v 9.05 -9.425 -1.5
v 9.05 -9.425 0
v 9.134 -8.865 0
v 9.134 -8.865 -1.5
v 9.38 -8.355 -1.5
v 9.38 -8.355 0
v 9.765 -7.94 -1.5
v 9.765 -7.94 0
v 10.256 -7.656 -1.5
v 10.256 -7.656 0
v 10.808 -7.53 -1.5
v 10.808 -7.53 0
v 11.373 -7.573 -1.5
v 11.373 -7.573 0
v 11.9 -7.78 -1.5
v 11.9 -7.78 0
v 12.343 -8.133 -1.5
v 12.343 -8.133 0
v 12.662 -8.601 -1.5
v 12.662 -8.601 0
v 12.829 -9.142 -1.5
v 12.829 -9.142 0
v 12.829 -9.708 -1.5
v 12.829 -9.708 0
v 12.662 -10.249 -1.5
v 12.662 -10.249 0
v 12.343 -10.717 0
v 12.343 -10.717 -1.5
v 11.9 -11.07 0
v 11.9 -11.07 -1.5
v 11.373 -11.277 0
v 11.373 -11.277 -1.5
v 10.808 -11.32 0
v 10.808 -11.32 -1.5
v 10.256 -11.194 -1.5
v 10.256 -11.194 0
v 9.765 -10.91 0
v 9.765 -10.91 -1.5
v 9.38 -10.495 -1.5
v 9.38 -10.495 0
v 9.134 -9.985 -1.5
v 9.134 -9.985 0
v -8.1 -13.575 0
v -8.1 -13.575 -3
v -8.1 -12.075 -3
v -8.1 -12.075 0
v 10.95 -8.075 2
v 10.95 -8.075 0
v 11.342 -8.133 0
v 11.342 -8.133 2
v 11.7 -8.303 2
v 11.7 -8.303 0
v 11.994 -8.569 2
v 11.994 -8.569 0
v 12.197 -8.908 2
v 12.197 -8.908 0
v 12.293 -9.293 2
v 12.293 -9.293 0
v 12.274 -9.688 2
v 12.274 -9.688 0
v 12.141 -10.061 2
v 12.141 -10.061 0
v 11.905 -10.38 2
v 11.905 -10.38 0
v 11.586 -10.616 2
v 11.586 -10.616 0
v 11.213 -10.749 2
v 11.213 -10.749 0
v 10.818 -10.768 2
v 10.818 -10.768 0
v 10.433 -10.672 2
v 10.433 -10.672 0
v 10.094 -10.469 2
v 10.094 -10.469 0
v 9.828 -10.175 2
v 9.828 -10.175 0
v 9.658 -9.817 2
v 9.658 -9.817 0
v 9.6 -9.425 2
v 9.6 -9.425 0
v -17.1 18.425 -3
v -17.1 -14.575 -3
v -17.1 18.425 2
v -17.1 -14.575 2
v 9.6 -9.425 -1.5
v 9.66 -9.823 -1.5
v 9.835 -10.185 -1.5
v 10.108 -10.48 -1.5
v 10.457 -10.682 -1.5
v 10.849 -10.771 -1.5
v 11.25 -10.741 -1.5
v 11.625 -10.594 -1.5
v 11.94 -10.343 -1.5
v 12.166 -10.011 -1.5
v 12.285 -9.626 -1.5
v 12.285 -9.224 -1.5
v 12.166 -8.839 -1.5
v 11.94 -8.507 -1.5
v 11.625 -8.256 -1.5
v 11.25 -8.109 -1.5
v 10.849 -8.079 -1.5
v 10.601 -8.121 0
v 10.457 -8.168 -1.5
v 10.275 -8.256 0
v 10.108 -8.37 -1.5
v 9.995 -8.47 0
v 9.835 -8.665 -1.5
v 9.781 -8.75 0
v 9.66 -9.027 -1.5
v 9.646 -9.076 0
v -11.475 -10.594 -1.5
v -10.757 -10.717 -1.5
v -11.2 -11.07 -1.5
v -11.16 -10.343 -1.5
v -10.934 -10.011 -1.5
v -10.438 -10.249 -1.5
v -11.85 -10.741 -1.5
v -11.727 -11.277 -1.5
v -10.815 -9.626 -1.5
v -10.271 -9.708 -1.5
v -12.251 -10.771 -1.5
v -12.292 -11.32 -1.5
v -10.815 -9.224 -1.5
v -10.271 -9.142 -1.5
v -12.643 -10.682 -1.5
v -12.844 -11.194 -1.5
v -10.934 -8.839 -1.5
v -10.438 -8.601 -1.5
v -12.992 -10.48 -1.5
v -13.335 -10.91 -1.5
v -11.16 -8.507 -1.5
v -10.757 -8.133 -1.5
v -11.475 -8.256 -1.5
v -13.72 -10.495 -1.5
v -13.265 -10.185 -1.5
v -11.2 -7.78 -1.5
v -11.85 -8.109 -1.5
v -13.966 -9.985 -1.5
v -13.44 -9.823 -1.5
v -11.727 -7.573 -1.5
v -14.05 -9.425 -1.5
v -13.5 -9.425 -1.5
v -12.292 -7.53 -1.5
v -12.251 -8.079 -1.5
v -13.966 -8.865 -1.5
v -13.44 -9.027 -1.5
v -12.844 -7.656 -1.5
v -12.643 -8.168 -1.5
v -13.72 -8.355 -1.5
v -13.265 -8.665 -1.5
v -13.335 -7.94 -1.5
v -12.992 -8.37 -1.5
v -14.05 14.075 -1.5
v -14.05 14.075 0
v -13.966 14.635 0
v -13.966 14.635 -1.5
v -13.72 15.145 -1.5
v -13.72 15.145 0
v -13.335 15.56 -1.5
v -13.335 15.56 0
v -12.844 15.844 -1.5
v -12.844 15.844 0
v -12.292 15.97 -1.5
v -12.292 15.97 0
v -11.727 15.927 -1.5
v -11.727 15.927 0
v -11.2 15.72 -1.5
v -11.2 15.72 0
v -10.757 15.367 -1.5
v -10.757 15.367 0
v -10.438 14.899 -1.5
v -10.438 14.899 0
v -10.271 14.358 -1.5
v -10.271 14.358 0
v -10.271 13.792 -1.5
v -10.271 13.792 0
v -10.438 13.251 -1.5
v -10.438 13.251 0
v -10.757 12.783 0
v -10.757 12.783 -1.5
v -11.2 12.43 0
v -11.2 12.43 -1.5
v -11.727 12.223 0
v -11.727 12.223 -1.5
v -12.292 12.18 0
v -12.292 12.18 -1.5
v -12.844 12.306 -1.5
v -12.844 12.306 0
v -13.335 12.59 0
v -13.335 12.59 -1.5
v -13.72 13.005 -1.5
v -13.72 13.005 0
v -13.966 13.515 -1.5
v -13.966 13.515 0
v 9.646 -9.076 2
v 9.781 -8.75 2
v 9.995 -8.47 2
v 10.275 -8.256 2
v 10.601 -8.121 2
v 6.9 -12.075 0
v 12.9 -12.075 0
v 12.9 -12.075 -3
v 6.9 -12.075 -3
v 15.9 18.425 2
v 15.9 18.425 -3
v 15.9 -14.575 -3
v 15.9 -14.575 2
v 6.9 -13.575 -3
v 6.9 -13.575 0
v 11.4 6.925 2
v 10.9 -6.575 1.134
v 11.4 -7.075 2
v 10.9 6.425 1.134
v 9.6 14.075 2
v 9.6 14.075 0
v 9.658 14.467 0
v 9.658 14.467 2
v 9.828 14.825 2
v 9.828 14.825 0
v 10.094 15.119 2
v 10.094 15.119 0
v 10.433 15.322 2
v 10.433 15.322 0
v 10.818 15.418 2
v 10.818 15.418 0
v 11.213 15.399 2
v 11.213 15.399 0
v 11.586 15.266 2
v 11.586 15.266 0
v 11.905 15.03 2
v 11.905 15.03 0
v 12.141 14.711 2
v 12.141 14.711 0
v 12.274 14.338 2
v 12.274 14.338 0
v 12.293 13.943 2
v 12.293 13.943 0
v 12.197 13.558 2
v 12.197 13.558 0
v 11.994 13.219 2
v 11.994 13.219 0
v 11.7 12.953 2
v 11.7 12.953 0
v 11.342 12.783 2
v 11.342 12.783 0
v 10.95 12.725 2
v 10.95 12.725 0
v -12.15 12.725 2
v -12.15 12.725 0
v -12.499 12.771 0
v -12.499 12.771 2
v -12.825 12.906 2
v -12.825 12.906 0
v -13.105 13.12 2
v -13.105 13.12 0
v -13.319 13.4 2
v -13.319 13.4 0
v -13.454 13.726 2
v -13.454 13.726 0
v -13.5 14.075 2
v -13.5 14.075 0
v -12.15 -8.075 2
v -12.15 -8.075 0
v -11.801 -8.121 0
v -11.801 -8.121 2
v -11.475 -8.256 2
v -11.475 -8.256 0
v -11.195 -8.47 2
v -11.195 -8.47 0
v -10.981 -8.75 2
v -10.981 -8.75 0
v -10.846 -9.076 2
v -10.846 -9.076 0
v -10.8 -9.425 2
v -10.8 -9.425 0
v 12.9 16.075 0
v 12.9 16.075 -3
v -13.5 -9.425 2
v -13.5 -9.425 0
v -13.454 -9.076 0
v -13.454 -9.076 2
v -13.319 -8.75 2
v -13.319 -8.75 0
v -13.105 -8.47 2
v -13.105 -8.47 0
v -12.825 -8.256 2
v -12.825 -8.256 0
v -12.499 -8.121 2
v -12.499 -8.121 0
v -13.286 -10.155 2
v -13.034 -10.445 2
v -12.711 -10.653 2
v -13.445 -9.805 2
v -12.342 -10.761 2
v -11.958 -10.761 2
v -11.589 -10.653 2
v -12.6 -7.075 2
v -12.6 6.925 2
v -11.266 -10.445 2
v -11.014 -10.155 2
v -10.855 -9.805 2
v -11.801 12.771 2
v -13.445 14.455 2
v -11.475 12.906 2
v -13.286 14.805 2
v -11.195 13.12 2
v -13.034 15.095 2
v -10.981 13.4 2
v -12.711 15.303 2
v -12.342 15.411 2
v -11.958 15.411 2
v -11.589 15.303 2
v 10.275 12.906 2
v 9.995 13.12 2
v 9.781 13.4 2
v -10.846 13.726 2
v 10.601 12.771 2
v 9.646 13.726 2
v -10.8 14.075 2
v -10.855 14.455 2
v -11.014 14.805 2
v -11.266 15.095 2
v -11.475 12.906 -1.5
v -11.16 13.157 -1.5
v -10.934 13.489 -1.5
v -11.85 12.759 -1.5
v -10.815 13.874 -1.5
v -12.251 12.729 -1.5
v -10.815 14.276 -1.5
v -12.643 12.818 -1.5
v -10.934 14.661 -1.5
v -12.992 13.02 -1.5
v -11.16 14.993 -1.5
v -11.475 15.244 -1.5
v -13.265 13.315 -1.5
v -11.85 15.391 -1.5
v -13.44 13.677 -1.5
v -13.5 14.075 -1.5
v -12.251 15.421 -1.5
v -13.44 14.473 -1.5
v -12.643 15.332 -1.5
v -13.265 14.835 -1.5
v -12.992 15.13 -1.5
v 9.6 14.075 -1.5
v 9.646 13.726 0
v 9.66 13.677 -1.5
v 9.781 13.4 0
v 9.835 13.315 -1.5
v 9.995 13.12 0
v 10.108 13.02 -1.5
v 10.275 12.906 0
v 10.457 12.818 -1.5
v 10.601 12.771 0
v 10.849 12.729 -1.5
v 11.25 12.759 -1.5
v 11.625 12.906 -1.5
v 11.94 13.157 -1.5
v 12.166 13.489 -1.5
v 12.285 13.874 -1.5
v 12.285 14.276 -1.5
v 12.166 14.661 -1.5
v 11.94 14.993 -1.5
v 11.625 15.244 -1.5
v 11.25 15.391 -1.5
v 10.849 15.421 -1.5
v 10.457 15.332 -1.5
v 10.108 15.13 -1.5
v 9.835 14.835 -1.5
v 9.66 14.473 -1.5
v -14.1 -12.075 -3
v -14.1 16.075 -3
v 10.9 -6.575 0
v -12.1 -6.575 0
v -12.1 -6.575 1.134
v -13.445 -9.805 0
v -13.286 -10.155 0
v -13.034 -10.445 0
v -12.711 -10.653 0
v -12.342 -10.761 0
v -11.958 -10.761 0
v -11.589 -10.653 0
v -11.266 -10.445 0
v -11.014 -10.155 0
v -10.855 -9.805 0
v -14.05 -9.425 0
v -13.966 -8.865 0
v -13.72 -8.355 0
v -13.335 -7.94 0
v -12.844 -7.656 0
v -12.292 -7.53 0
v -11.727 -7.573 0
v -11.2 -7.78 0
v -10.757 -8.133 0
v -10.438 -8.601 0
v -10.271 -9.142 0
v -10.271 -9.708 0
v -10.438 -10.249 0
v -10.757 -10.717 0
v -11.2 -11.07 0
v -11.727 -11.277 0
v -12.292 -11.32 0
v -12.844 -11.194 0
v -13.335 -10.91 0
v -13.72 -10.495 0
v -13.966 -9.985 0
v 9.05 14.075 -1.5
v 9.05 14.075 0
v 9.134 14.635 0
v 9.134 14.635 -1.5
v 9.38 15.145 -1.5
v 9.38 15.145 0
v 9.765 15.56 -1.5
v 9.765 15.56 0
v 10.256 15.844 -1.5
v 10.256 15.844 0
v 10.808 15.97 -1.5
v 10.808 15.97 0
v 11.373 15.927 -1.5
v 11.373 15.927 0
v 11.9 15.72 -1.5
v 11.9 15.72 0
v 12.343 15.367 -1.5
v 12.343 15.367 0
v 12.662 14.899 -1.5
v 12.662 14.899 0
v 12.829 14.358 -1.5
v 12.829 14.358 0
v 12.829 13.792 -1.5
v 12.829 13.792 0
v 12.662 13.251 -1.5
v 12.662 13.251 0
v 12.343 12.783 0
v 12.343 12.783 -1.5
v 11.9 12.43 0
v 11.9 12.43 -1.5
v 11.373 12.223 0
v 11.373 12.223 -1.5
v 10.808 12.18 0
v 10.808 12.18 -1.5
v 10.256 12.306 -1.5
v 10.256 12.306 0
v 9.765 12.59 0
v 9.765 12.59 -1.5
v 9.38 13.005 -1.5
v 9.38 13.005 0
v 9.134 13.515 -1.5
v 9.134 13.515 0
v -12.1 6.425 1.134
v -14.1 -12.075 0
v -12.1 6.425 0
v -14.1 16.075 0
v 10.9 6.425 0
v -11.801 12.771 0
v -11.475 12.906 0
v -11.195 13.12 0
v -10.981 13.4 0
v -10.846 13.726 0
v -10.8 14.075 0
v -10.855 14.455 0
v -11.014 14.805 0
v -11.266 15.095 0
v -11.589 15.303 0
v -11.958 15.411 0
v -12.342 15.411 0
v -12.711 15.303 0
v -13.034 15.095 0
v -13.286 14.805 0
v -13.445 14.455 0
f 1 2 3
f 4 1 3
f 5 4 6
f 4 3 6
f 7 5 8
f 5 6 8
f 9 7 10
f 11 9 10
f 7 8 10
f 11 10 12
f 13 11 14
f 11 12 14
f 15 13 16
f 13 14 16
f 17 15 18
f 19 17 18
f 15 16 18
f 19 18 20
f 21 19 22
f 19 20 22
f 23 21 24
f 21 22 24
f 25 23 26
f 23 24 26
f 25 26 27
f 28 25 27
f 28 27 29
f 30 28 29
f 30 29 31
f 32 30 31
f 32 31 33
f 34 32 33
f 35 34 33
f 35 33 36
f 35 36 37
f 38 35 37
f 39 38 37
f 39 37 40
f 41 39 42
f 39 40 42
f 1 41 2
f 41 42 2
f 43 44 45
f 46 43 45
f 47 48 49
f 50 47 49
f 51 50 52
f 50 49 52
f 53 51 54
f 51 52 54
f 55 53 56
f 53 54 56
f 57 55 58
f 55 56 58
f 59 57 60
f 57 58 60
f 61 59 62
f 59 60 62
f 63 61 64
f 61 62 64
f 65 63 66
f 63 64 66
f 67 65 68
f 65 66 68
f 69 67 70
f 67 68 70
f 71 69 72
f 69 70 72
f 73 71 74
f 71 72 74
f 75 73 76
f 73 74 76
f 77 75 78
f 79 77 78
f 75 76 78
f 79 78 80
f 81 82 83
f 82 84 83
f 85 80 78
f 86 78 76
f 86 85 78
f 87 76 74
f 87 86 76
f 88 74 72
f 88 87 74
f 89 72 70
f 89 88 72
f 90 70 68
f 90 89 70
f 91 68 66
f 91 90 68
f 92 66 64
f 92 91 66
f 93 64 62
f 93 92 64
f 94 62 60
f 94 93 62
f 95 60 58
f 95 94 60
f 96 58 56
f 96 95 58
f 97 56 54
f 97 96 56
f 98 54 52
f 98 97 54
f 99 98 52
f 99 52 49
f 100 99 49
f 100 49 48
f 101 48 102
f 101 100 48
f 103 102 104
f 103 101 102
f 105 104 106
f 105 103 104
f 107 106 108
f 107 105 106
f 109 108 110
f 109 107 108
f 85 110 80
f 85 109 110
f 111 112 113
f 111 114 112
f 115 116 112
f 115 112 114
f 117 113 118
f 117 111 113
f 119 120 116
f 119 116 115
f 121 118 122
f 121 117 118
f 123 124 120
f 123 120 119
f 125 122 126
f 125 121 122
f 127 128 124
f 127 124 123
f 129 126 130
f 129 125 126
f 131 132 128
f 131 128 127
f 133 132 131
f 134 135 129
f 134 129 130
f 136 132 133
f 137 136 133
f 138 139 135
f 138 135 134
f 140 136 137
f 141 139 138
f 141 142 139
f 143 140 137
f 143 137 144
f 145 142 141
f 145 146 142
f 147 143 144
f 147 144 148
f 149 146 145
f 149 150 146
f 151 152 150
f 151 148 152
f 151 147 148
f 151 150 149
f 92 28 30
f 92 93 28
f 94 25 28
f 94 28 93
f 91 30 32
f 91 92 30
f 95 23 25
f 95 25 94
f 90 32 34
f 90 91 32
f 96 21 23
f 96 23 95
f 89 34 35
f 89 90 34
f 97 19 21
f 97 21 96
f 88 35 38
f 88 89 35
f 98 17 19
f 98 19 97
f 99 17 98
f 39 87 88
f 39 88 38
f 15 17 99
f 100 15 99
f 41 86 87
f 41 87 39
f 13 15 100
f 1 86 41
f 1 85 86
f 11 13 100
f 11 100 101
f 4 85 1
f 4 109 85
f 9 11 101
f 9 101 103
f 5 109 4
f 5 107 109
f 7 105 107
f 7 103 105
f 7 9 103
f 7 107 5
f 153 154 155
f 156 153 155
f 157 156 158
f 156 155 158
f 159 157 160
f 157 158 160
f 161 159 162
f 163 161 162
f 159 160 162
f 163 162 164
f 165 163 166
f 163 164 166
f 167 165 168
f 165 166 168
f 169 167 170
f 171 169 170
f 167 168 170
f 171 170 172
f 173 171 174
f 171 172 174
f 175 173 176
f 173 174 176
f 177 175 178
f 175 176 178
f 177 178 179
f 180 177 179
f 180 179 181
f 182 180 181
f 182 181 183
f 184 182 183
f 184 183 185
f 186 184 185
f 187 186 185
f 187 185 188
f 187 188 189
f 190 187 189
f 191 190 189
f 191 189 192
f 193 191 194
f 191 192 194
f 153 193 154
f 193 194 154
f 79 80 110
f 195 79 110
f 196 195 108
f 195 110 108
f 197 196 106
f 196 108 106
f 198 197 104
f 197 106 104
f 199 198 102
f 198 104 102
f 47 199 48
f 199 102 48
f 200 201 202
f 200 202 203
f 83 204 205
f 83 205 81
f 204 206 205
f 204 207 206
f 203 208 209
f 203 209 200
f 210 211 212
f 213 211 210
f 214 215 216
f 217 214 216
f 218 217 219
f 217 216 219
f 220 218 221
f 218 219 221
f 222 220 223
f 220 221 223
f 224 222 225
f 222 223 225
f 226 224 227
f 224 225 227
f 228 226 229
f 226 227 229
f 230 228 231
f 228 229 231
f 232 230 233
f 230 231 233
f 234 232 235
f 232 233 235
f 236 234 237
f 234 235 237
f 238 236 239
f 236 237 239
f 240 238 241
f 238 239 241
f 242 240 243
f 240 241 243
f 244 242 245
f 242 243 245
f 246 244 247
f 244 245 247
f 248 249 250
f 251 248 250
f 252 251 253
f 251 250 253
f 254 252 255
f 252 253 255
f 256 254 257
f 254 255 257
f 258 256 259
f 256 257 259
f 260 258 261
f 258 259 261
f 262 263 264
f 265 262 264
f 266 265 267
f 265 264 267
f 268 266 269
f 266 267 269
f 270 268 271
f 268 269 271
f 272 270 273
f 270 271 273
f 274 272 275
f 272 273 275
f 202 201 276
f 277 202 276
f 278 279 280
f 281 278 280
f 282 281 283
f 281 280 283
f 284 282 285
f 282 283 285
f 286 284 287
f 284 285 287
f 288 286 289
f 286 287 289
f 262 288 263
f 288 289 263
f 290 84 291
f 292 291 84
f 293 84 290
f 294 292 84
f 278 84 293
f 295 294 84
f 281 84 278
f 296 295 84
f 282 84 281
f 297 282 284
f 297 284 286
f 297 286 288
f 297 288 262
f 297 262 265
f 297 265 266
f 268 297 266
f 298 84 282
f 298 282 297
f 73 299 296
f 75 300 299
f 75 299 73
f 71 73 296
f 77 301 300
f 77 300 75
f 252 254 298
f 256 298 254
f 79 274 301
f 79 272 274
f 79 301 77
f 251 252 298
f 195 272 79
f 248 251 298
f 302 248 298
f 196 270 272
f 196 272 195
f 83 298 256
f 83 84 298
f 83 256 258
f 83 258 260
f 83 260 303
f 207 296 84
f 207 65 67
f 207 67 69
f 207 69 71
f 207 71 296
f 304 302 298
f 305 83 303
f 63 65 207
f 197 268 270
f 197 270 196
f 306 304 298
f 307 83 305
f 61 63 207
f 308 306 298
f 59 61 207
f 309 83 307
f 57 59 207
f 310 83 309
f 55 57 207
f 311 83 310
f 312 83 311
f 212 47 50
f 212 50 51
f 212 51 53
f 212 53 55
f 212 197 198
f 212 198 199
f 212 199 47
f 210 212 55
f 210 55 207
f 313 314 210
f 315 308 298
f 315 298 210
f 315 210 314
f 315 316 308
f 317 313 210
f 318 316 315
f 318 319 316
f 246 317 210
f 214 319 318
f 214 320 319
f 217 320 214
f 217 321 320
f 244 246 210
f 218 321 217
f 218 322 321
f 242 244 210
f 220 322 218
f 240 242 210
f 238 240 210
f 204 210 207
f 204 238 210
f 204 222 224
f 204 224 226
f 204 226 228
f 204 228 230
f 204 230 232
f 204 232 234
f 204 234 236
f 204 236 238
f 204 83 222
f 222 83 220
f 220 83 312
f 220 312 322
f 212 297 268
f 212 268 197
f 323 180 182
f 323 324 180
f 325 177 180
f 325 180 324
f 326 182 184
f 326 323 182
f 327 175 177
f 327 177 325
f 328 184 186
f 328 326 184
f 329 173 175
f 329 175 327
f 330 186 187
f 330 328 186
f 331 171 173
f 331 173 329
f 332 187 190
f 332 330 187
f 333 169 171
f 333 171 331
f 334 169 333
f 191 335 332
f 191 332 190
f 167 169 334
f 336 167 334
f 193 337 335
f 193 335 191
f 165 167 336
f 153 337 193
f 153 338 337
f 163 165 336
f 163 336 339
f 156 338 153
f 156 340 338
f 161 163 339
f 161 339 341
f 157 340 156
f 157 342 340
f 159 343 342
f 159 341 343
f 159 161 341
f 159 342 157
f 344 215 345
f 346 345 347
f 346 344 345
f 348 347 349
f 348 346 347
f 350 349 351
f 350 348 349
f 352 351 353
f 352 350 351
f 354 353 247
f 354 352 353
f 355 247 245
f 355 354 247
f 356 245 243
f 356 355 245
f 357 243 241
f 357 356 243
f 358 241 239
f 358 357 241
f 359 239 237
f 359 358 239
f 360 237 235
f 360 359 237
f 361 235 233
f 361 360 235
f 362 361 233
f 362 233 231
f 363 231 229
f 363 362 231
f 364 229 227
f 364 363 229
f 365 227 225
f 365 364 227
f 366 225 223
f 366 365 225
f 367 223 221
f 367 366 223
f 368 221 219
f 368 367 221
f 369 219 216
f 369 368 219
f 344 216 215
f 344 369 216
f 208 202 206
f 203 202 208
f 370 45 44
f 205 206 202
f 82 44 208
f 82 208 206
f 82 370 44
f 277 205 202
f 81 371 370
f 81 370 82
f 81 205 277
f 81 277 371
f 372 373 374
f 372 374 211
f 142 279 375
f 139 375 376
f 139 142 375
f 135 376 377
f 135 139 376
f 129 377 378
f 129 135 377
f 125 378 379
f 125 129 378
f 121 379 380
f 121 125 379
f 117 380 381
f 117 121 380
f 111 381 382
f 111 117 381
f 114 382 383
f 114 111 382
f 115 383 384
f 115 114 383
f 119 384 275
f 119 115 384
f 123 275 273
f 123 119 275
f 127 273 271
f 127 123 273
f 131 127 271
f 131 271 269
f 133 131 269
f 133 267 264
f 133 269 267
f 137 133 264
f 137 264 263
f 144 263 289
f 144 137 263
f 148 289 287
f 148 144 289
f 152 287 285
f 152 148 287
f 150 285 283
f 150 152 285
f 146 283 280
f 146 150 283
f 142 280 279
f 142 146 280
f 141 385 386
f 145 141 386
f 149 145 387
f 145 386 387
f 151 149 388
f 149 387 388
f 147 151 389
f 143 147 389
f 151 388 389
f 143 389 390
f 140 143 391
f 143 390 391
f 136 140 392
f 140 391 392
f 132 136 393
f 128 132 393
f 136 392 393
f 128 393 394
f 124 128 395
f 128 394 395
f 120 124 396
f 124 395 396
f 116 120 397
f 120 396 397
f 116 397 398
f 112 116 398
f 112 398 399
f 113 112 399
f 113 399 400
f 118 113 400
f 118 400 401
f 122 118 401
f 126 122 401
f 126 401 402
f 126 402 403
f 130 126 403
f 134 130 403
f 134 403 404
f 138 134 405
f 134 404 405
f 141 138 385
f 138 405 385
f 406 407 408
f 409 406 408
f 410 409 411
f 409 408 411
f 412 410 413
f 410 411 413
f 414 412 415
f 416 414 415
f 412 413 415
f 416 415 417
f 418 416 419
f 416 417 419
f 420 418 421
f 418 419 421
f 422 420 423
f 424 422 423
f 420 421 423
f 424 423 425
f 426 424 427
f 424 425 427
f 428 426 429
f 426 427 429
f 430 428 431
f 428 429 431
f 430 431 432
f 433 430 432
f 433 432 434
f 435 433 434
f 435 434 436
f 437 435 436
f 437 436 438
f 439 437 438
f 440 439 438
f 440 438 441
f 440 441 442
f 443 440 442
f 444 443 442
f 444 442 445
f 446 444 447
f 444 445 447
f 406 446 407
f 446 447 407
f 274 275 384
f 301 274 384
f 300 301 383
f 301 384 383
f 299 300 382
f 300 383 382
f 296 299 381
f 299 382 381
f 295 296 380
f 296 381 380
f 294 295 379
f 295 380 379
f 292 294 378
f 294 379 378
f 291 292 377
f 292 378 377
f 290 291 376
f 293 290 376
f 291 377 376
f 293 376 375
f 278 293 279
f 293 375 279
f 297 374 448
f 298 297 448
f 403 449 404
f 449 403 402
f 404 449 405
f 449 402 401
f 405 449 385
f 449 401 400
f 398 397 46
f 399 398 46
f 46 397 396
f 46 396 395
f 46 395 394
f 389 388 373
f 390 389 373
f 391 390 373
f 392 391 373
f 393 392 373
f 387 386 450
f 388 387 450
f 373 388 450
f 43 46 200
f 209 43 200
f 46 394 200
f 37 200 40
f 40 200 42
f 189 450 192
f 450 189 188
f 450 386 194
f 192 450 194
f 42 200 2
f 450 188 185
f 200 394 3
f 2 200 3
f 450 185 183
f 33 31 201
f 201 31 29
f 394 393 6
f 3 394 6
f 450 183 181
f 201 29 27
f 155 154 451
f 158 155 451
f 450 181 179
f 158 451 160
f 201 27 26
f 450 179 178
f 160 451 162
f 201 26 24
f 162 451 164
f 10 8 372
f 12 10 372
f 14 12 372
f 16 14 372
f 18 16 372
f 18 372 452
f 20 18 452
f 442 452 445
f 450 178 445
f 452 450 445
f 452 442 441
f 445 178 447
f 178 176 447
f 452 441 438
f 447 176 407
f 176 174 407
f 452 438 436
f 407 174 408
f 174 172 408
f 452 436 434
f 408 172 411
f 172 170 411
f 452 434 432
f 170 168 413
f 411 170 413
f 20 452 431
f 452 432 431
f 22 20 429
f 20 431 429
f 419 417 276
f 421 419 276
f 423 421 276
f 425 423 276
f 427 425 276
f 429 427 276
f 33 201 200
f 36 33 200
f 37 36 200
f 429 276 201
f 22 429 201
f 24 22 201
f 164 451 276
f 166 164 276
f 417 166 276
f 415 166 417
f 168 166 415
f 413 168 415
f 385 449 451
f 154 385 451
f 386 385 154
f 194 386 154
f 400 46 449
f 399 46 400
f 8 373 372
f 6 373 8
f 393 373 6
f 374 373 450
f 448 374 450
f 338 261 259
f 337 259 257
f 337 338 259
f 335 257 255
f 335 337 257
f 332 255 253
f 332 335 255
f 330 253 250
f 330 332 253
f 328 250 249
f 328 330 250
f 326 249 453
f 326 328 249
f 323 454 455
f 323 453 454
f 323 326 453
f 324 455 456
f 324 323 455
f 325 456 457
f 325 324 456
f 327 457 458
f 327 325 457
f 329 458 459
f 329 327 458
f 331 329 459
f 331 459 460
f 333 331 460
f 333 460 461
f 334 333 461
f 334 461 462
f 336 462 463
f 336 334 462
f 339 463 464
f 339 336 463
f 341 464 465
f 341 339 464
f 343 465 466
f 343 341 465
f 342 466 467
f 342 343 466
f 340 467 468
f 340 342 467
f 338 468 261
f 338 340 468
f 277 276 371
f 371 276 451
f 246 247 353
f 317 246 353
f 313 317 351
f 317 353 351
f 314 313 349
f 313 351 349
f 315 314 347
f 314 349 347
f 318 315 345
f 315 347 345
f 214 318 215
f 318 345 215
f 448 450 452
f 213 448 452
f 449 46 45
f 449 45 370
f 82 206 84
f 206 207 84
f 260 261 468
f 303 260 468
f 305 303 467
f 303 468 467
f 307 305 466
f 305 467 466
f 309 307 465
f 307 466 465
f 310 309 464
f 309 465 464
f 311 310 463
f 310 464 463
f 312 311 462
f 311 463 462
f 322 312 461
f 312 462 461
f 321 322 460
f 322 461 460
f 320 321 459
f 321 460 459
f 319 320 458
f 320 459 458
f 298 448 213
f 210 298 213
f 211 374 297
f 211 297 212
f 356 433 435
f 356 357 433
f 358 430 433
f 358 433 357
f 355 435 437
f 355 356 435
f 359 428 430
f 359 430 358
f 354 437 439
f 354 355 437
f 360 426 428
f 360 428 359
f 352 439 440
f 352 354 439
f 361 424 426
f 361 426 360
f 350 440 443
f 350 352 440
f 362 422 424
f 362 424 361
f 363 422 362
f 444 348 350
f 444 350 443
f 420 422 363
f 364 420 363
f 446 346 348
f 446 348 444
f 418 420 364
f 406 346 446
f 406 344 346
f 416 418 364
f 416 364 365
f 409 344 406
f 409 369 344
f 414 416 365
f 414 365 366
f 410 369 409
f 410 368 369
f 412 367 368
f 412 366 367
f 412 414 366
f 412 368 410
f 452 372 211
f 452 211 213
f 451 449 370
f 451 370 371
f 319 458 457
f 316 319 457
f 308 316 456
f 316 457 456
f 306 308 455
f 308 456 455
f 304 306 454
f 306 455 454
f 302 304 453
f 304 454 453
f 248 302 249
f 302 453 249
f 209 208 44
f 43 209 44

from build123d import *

# Parameters (mm, degrees)
SKETCH1_W           = 33
SKETCH1_H           = 33
SKETCH1_W_2         = 23
SKETCH1_H_2         = 13
BOSS_EXTRUDE1_DEPTH = 2
CHAMFER1_SIZE       = 0.5
CHAMFER1_SIZE2      = 0.866025404
SKETCH2_W           = 33
SKETCH2_H           = 33
SKETCH2_W_2         = 27
SKETCH2_H_2         = 28.15
BOSS_EXTRUDE2_DEPTH = 3
CUT_EXTRUDE2_DEPTH  = 3
SKETCH4_R           = 1.9
SKETCH4_R_2         = 1.1
BOSS_EXTRUDE3_DEPTH = 1.5
CUT_EXTRUDE3_START  = -10
SKETCH5_R           = 1.35
CUT_EXTRUDE3_DEPTH  = 10
SKETCH6_W           = 15
SKETCH6_H           = 1.5
CUT_EXTRUDE4_DEPTH  = 3


with BuildPart() as part:
    # Sketch1 → Boss-Extrude1 (new body)
    with BuildSketch(Plane.XY):
        with Locations((-0.6, 1.925)):
            Rectangle(SKETCH1_W, SKETCH1_H)
        with Locations((-0.6, -0.075)):
            Rectangle(SKETCH1_W_2, SKETCH1_H_2, mode=Mode.SUBTRACT)
    extrude(amount=BOSS_EXTRUDE1_DEPTH)

    # Chamfer1
    chamfer1_edges = [part.edges().sort_by_distance(p)[0] for p in [
        (-12.1, -0.075, 2),
        (-0.6, -6.575, 2),
        (10.9, -0.075, 2),
        (-0.6, 6.425, 2),
    ]]
    chamfer1_side = [part.faces().sort_by_distance(p)[0] for p in [
        (-0.6, -14.108309524, 2),
    ]]
    chamfer(chamfer1_edges, length=CHAMFER1_SIZE, length2=CHAMFER1_SIZE2, reference=chamfer1_side[0])

    # Sketch2 → Boss-Extrude2 (add)
    with BuildSketch(Plane(origin=(0, 0, 0), x_dir=(-1, 0, 0), z_dir=(0, 0, -1))):
        with Locations((0.6, 1.925)):
            Rectangle(SKETCH2_W, SKETCH2_H)
        with Locations((0.6, 2)):
            Rectangle(SKETCH2_W_2, SKETCH2_H_2, mode=Mode.SUBTRACT)
    extrude(amount=BOSS_EXTRUDE2_DEPTH)

    # Sketch3 → Cut-Extrude2 (cut)
    with BuildSketch(Plane(origin=(0, 0, 0), x_dir=(-1, 0, 0), z_dir=(0, 0, -1))):
        with BuildLine():
            Line((-10.95, 12.725), (-10.95, 14.075))
            Line((-10.95, 14.075), (-9.6, 14.075))
            ThreePointArc((-9.6, 14.075), (-11.904594155, 15.029594155), (-10.95, 12.725))
        make_face()
        with BuildLine():
            Line((-9.6, 14.075), (-10.95, 14.075))
            Line((-10.95, 14.075), (-10.95, 12.725))
            ThreePointArc((-10.95, 12.725), (-9.995405845, 13.120405845), (-9.6, 14.075))
        make_face()
        with BuildLine():
            ThreePointArc((13.5, 14.075), (12.15, 15.425), (10.8, 14.075))
            Line((10.8, 14.075), (12.15, 14.075))
            Line((12.15, 14.075), (12.15, 12.725))
            ThreePointArc((12.15, 12.725), (13.104594155, 13.120405845), (13.5, 14.075))
        make_face()
        with BuildLine():
            Line((12.15, 14.075), (10.8, 14.075))
            ThreePointArc((10.8, 14.075), (11.195405845, 13.120405845), (12.15, 12.725))
            Line((12.15, 12.725), (12.15, 14.075))
        make_face()
        with BuildLine():
            ThreePointArc((13.5, -9.425), (13.104594155, -8.470405845), (12.15, -8.075))
            Line((12.15, -8.075), (12.15, -9.425))
            Line((12.15, -9.425), (10.8, -9.425))
            ThreePointArc((10.8, -9.425), (12.15, -10.775), (13.5, -9.425))
        make_face()
        with BuildLine():
            Line((12.15, -9.425), (12.15, -8.075))
            ThreePointArc((12.15, -8.075), (11.195405845, -8.470405845), (10.8, -9.425))
            Line((10.8, -9.425), (12.15, -9.425))
        make_face()
        with BuildLine():
            ThreePointArc((-9.6, -9.425), (-9.995405845, -8.470405845), (-10.95, -8.075))
            Line((-10.95, -8.075), (-10.95, -9.425))
            Line((-10.95, -9.425), (-9.6, -9.425))
        make_face()
        with BuildLine():
            Line((-10.95, -9.425), (-10.95, -8.075))
            ThreePointArc((-10.95, -8.075), (-11.904594155, -10.379594155), (-9.6, -9.425))
            Line((-9.6, -9.425), (-10.95, -9.425))
        make_face()
    extrude(amount=-CUT_EXTRUDE2_DEPTH, mode=Mode.SUBTRACT)

    # Sketch4 → Boss-Extrude3 (add)
    # profile 1 of 4: a face of its own
    with BuildSketch(Plane(origin=(0, 0, 0), x_dir=(-1, 0, 0), z_dir=(0, 0, -1))):
        with Locations((-10.95, 14.075)):
            Circle(SKETCH4_R)
        with Locations((-10.95, 14.075)):
            Circle(SKETCH4_R_2, mode=Mode.SUBTRACT)
    # profile 2 of 4: a face of its own
    with BuildSketch(Plane(origin=(0, 0, 0), x_dir=(-1, 0, 0), z_dir=(0, 0, -1))):
        with Locations((12.15, 14.075)):
            Circle(SKETCH4_R)
        with Locations((12.15, 14.075)):
            Circle(SKETCH4_R_2, mode=Mode.SUBTRACT)
    # profile 3 of 4: a face of its own
    with BuildSketch(Plane(origin=(0, 0, 0), x_dir=(-1, 0, 0), z_dir=(0, 0, -1))):
        with Locations((-10.95, -9.425)):
            Circle(SKETCH4_R)
        with Locations((-10.95, -9.425)):
            Circle(SKETCH4_R_2, mode=Mode.SUBTRACT)
    # profile 4 of 4: a face of its own
    with BuildSketch(Plane(origin=(0, 0, 0), x_dir=(-1, 0, 0), z_dir=(0, 0, -1))):
        with Locations((12.15, -9.425)):
            Circle(SKETCH4_R)
        with Locations((12.15, -9.425)):
            Circle(SKETCH4_R_2, mode=Mode.SUBTRACT)
    extrude(amount=BOSS_EXTRUDE3_DEPTH)

    # Sketch5 → Cut-Extrude3 (cut)
    with BuildSketch(Plane.XY.offset(2).offset(CUT_EXTRUDE3_START)):
        with Locations(Location((-12.15, 14.075, 0), (0, 0, 180))):
            Circle(SKETCH5_R)
        with Locations(Location((10.95, 14.075, 0), (0, 0, 180))):
            Circle(SKETCH5_R)
        with Locations(Location((-12.15, -9.425, 0), (0, 0, 180))):
            Circle(SKETCH5_R)
        with Locations(Location((10.95, -9.425, 0), (0, 0, 180))):
            Circle(SKETCH5_R)
    extrude(amount=CUT_EXTRUDE3_DEPTH, mode=Mode.SUBTRACT)

    # Sketch6 → Cut-Extrude4 (cut)
    with BuildSketch(Plane(origin=(0, 0, -3), x_dir=(-1, 0, 0), z_dir=(0, 0, -1))):
        with Locations((0.6, -12.825)):
            Rectangle(SKETCH6_W, SKETCH6_H)
    extrude(amount=-CUT_EXTRUDE4_DEPTH, mode=Mode.SUBTRACT)


solid = part.part
